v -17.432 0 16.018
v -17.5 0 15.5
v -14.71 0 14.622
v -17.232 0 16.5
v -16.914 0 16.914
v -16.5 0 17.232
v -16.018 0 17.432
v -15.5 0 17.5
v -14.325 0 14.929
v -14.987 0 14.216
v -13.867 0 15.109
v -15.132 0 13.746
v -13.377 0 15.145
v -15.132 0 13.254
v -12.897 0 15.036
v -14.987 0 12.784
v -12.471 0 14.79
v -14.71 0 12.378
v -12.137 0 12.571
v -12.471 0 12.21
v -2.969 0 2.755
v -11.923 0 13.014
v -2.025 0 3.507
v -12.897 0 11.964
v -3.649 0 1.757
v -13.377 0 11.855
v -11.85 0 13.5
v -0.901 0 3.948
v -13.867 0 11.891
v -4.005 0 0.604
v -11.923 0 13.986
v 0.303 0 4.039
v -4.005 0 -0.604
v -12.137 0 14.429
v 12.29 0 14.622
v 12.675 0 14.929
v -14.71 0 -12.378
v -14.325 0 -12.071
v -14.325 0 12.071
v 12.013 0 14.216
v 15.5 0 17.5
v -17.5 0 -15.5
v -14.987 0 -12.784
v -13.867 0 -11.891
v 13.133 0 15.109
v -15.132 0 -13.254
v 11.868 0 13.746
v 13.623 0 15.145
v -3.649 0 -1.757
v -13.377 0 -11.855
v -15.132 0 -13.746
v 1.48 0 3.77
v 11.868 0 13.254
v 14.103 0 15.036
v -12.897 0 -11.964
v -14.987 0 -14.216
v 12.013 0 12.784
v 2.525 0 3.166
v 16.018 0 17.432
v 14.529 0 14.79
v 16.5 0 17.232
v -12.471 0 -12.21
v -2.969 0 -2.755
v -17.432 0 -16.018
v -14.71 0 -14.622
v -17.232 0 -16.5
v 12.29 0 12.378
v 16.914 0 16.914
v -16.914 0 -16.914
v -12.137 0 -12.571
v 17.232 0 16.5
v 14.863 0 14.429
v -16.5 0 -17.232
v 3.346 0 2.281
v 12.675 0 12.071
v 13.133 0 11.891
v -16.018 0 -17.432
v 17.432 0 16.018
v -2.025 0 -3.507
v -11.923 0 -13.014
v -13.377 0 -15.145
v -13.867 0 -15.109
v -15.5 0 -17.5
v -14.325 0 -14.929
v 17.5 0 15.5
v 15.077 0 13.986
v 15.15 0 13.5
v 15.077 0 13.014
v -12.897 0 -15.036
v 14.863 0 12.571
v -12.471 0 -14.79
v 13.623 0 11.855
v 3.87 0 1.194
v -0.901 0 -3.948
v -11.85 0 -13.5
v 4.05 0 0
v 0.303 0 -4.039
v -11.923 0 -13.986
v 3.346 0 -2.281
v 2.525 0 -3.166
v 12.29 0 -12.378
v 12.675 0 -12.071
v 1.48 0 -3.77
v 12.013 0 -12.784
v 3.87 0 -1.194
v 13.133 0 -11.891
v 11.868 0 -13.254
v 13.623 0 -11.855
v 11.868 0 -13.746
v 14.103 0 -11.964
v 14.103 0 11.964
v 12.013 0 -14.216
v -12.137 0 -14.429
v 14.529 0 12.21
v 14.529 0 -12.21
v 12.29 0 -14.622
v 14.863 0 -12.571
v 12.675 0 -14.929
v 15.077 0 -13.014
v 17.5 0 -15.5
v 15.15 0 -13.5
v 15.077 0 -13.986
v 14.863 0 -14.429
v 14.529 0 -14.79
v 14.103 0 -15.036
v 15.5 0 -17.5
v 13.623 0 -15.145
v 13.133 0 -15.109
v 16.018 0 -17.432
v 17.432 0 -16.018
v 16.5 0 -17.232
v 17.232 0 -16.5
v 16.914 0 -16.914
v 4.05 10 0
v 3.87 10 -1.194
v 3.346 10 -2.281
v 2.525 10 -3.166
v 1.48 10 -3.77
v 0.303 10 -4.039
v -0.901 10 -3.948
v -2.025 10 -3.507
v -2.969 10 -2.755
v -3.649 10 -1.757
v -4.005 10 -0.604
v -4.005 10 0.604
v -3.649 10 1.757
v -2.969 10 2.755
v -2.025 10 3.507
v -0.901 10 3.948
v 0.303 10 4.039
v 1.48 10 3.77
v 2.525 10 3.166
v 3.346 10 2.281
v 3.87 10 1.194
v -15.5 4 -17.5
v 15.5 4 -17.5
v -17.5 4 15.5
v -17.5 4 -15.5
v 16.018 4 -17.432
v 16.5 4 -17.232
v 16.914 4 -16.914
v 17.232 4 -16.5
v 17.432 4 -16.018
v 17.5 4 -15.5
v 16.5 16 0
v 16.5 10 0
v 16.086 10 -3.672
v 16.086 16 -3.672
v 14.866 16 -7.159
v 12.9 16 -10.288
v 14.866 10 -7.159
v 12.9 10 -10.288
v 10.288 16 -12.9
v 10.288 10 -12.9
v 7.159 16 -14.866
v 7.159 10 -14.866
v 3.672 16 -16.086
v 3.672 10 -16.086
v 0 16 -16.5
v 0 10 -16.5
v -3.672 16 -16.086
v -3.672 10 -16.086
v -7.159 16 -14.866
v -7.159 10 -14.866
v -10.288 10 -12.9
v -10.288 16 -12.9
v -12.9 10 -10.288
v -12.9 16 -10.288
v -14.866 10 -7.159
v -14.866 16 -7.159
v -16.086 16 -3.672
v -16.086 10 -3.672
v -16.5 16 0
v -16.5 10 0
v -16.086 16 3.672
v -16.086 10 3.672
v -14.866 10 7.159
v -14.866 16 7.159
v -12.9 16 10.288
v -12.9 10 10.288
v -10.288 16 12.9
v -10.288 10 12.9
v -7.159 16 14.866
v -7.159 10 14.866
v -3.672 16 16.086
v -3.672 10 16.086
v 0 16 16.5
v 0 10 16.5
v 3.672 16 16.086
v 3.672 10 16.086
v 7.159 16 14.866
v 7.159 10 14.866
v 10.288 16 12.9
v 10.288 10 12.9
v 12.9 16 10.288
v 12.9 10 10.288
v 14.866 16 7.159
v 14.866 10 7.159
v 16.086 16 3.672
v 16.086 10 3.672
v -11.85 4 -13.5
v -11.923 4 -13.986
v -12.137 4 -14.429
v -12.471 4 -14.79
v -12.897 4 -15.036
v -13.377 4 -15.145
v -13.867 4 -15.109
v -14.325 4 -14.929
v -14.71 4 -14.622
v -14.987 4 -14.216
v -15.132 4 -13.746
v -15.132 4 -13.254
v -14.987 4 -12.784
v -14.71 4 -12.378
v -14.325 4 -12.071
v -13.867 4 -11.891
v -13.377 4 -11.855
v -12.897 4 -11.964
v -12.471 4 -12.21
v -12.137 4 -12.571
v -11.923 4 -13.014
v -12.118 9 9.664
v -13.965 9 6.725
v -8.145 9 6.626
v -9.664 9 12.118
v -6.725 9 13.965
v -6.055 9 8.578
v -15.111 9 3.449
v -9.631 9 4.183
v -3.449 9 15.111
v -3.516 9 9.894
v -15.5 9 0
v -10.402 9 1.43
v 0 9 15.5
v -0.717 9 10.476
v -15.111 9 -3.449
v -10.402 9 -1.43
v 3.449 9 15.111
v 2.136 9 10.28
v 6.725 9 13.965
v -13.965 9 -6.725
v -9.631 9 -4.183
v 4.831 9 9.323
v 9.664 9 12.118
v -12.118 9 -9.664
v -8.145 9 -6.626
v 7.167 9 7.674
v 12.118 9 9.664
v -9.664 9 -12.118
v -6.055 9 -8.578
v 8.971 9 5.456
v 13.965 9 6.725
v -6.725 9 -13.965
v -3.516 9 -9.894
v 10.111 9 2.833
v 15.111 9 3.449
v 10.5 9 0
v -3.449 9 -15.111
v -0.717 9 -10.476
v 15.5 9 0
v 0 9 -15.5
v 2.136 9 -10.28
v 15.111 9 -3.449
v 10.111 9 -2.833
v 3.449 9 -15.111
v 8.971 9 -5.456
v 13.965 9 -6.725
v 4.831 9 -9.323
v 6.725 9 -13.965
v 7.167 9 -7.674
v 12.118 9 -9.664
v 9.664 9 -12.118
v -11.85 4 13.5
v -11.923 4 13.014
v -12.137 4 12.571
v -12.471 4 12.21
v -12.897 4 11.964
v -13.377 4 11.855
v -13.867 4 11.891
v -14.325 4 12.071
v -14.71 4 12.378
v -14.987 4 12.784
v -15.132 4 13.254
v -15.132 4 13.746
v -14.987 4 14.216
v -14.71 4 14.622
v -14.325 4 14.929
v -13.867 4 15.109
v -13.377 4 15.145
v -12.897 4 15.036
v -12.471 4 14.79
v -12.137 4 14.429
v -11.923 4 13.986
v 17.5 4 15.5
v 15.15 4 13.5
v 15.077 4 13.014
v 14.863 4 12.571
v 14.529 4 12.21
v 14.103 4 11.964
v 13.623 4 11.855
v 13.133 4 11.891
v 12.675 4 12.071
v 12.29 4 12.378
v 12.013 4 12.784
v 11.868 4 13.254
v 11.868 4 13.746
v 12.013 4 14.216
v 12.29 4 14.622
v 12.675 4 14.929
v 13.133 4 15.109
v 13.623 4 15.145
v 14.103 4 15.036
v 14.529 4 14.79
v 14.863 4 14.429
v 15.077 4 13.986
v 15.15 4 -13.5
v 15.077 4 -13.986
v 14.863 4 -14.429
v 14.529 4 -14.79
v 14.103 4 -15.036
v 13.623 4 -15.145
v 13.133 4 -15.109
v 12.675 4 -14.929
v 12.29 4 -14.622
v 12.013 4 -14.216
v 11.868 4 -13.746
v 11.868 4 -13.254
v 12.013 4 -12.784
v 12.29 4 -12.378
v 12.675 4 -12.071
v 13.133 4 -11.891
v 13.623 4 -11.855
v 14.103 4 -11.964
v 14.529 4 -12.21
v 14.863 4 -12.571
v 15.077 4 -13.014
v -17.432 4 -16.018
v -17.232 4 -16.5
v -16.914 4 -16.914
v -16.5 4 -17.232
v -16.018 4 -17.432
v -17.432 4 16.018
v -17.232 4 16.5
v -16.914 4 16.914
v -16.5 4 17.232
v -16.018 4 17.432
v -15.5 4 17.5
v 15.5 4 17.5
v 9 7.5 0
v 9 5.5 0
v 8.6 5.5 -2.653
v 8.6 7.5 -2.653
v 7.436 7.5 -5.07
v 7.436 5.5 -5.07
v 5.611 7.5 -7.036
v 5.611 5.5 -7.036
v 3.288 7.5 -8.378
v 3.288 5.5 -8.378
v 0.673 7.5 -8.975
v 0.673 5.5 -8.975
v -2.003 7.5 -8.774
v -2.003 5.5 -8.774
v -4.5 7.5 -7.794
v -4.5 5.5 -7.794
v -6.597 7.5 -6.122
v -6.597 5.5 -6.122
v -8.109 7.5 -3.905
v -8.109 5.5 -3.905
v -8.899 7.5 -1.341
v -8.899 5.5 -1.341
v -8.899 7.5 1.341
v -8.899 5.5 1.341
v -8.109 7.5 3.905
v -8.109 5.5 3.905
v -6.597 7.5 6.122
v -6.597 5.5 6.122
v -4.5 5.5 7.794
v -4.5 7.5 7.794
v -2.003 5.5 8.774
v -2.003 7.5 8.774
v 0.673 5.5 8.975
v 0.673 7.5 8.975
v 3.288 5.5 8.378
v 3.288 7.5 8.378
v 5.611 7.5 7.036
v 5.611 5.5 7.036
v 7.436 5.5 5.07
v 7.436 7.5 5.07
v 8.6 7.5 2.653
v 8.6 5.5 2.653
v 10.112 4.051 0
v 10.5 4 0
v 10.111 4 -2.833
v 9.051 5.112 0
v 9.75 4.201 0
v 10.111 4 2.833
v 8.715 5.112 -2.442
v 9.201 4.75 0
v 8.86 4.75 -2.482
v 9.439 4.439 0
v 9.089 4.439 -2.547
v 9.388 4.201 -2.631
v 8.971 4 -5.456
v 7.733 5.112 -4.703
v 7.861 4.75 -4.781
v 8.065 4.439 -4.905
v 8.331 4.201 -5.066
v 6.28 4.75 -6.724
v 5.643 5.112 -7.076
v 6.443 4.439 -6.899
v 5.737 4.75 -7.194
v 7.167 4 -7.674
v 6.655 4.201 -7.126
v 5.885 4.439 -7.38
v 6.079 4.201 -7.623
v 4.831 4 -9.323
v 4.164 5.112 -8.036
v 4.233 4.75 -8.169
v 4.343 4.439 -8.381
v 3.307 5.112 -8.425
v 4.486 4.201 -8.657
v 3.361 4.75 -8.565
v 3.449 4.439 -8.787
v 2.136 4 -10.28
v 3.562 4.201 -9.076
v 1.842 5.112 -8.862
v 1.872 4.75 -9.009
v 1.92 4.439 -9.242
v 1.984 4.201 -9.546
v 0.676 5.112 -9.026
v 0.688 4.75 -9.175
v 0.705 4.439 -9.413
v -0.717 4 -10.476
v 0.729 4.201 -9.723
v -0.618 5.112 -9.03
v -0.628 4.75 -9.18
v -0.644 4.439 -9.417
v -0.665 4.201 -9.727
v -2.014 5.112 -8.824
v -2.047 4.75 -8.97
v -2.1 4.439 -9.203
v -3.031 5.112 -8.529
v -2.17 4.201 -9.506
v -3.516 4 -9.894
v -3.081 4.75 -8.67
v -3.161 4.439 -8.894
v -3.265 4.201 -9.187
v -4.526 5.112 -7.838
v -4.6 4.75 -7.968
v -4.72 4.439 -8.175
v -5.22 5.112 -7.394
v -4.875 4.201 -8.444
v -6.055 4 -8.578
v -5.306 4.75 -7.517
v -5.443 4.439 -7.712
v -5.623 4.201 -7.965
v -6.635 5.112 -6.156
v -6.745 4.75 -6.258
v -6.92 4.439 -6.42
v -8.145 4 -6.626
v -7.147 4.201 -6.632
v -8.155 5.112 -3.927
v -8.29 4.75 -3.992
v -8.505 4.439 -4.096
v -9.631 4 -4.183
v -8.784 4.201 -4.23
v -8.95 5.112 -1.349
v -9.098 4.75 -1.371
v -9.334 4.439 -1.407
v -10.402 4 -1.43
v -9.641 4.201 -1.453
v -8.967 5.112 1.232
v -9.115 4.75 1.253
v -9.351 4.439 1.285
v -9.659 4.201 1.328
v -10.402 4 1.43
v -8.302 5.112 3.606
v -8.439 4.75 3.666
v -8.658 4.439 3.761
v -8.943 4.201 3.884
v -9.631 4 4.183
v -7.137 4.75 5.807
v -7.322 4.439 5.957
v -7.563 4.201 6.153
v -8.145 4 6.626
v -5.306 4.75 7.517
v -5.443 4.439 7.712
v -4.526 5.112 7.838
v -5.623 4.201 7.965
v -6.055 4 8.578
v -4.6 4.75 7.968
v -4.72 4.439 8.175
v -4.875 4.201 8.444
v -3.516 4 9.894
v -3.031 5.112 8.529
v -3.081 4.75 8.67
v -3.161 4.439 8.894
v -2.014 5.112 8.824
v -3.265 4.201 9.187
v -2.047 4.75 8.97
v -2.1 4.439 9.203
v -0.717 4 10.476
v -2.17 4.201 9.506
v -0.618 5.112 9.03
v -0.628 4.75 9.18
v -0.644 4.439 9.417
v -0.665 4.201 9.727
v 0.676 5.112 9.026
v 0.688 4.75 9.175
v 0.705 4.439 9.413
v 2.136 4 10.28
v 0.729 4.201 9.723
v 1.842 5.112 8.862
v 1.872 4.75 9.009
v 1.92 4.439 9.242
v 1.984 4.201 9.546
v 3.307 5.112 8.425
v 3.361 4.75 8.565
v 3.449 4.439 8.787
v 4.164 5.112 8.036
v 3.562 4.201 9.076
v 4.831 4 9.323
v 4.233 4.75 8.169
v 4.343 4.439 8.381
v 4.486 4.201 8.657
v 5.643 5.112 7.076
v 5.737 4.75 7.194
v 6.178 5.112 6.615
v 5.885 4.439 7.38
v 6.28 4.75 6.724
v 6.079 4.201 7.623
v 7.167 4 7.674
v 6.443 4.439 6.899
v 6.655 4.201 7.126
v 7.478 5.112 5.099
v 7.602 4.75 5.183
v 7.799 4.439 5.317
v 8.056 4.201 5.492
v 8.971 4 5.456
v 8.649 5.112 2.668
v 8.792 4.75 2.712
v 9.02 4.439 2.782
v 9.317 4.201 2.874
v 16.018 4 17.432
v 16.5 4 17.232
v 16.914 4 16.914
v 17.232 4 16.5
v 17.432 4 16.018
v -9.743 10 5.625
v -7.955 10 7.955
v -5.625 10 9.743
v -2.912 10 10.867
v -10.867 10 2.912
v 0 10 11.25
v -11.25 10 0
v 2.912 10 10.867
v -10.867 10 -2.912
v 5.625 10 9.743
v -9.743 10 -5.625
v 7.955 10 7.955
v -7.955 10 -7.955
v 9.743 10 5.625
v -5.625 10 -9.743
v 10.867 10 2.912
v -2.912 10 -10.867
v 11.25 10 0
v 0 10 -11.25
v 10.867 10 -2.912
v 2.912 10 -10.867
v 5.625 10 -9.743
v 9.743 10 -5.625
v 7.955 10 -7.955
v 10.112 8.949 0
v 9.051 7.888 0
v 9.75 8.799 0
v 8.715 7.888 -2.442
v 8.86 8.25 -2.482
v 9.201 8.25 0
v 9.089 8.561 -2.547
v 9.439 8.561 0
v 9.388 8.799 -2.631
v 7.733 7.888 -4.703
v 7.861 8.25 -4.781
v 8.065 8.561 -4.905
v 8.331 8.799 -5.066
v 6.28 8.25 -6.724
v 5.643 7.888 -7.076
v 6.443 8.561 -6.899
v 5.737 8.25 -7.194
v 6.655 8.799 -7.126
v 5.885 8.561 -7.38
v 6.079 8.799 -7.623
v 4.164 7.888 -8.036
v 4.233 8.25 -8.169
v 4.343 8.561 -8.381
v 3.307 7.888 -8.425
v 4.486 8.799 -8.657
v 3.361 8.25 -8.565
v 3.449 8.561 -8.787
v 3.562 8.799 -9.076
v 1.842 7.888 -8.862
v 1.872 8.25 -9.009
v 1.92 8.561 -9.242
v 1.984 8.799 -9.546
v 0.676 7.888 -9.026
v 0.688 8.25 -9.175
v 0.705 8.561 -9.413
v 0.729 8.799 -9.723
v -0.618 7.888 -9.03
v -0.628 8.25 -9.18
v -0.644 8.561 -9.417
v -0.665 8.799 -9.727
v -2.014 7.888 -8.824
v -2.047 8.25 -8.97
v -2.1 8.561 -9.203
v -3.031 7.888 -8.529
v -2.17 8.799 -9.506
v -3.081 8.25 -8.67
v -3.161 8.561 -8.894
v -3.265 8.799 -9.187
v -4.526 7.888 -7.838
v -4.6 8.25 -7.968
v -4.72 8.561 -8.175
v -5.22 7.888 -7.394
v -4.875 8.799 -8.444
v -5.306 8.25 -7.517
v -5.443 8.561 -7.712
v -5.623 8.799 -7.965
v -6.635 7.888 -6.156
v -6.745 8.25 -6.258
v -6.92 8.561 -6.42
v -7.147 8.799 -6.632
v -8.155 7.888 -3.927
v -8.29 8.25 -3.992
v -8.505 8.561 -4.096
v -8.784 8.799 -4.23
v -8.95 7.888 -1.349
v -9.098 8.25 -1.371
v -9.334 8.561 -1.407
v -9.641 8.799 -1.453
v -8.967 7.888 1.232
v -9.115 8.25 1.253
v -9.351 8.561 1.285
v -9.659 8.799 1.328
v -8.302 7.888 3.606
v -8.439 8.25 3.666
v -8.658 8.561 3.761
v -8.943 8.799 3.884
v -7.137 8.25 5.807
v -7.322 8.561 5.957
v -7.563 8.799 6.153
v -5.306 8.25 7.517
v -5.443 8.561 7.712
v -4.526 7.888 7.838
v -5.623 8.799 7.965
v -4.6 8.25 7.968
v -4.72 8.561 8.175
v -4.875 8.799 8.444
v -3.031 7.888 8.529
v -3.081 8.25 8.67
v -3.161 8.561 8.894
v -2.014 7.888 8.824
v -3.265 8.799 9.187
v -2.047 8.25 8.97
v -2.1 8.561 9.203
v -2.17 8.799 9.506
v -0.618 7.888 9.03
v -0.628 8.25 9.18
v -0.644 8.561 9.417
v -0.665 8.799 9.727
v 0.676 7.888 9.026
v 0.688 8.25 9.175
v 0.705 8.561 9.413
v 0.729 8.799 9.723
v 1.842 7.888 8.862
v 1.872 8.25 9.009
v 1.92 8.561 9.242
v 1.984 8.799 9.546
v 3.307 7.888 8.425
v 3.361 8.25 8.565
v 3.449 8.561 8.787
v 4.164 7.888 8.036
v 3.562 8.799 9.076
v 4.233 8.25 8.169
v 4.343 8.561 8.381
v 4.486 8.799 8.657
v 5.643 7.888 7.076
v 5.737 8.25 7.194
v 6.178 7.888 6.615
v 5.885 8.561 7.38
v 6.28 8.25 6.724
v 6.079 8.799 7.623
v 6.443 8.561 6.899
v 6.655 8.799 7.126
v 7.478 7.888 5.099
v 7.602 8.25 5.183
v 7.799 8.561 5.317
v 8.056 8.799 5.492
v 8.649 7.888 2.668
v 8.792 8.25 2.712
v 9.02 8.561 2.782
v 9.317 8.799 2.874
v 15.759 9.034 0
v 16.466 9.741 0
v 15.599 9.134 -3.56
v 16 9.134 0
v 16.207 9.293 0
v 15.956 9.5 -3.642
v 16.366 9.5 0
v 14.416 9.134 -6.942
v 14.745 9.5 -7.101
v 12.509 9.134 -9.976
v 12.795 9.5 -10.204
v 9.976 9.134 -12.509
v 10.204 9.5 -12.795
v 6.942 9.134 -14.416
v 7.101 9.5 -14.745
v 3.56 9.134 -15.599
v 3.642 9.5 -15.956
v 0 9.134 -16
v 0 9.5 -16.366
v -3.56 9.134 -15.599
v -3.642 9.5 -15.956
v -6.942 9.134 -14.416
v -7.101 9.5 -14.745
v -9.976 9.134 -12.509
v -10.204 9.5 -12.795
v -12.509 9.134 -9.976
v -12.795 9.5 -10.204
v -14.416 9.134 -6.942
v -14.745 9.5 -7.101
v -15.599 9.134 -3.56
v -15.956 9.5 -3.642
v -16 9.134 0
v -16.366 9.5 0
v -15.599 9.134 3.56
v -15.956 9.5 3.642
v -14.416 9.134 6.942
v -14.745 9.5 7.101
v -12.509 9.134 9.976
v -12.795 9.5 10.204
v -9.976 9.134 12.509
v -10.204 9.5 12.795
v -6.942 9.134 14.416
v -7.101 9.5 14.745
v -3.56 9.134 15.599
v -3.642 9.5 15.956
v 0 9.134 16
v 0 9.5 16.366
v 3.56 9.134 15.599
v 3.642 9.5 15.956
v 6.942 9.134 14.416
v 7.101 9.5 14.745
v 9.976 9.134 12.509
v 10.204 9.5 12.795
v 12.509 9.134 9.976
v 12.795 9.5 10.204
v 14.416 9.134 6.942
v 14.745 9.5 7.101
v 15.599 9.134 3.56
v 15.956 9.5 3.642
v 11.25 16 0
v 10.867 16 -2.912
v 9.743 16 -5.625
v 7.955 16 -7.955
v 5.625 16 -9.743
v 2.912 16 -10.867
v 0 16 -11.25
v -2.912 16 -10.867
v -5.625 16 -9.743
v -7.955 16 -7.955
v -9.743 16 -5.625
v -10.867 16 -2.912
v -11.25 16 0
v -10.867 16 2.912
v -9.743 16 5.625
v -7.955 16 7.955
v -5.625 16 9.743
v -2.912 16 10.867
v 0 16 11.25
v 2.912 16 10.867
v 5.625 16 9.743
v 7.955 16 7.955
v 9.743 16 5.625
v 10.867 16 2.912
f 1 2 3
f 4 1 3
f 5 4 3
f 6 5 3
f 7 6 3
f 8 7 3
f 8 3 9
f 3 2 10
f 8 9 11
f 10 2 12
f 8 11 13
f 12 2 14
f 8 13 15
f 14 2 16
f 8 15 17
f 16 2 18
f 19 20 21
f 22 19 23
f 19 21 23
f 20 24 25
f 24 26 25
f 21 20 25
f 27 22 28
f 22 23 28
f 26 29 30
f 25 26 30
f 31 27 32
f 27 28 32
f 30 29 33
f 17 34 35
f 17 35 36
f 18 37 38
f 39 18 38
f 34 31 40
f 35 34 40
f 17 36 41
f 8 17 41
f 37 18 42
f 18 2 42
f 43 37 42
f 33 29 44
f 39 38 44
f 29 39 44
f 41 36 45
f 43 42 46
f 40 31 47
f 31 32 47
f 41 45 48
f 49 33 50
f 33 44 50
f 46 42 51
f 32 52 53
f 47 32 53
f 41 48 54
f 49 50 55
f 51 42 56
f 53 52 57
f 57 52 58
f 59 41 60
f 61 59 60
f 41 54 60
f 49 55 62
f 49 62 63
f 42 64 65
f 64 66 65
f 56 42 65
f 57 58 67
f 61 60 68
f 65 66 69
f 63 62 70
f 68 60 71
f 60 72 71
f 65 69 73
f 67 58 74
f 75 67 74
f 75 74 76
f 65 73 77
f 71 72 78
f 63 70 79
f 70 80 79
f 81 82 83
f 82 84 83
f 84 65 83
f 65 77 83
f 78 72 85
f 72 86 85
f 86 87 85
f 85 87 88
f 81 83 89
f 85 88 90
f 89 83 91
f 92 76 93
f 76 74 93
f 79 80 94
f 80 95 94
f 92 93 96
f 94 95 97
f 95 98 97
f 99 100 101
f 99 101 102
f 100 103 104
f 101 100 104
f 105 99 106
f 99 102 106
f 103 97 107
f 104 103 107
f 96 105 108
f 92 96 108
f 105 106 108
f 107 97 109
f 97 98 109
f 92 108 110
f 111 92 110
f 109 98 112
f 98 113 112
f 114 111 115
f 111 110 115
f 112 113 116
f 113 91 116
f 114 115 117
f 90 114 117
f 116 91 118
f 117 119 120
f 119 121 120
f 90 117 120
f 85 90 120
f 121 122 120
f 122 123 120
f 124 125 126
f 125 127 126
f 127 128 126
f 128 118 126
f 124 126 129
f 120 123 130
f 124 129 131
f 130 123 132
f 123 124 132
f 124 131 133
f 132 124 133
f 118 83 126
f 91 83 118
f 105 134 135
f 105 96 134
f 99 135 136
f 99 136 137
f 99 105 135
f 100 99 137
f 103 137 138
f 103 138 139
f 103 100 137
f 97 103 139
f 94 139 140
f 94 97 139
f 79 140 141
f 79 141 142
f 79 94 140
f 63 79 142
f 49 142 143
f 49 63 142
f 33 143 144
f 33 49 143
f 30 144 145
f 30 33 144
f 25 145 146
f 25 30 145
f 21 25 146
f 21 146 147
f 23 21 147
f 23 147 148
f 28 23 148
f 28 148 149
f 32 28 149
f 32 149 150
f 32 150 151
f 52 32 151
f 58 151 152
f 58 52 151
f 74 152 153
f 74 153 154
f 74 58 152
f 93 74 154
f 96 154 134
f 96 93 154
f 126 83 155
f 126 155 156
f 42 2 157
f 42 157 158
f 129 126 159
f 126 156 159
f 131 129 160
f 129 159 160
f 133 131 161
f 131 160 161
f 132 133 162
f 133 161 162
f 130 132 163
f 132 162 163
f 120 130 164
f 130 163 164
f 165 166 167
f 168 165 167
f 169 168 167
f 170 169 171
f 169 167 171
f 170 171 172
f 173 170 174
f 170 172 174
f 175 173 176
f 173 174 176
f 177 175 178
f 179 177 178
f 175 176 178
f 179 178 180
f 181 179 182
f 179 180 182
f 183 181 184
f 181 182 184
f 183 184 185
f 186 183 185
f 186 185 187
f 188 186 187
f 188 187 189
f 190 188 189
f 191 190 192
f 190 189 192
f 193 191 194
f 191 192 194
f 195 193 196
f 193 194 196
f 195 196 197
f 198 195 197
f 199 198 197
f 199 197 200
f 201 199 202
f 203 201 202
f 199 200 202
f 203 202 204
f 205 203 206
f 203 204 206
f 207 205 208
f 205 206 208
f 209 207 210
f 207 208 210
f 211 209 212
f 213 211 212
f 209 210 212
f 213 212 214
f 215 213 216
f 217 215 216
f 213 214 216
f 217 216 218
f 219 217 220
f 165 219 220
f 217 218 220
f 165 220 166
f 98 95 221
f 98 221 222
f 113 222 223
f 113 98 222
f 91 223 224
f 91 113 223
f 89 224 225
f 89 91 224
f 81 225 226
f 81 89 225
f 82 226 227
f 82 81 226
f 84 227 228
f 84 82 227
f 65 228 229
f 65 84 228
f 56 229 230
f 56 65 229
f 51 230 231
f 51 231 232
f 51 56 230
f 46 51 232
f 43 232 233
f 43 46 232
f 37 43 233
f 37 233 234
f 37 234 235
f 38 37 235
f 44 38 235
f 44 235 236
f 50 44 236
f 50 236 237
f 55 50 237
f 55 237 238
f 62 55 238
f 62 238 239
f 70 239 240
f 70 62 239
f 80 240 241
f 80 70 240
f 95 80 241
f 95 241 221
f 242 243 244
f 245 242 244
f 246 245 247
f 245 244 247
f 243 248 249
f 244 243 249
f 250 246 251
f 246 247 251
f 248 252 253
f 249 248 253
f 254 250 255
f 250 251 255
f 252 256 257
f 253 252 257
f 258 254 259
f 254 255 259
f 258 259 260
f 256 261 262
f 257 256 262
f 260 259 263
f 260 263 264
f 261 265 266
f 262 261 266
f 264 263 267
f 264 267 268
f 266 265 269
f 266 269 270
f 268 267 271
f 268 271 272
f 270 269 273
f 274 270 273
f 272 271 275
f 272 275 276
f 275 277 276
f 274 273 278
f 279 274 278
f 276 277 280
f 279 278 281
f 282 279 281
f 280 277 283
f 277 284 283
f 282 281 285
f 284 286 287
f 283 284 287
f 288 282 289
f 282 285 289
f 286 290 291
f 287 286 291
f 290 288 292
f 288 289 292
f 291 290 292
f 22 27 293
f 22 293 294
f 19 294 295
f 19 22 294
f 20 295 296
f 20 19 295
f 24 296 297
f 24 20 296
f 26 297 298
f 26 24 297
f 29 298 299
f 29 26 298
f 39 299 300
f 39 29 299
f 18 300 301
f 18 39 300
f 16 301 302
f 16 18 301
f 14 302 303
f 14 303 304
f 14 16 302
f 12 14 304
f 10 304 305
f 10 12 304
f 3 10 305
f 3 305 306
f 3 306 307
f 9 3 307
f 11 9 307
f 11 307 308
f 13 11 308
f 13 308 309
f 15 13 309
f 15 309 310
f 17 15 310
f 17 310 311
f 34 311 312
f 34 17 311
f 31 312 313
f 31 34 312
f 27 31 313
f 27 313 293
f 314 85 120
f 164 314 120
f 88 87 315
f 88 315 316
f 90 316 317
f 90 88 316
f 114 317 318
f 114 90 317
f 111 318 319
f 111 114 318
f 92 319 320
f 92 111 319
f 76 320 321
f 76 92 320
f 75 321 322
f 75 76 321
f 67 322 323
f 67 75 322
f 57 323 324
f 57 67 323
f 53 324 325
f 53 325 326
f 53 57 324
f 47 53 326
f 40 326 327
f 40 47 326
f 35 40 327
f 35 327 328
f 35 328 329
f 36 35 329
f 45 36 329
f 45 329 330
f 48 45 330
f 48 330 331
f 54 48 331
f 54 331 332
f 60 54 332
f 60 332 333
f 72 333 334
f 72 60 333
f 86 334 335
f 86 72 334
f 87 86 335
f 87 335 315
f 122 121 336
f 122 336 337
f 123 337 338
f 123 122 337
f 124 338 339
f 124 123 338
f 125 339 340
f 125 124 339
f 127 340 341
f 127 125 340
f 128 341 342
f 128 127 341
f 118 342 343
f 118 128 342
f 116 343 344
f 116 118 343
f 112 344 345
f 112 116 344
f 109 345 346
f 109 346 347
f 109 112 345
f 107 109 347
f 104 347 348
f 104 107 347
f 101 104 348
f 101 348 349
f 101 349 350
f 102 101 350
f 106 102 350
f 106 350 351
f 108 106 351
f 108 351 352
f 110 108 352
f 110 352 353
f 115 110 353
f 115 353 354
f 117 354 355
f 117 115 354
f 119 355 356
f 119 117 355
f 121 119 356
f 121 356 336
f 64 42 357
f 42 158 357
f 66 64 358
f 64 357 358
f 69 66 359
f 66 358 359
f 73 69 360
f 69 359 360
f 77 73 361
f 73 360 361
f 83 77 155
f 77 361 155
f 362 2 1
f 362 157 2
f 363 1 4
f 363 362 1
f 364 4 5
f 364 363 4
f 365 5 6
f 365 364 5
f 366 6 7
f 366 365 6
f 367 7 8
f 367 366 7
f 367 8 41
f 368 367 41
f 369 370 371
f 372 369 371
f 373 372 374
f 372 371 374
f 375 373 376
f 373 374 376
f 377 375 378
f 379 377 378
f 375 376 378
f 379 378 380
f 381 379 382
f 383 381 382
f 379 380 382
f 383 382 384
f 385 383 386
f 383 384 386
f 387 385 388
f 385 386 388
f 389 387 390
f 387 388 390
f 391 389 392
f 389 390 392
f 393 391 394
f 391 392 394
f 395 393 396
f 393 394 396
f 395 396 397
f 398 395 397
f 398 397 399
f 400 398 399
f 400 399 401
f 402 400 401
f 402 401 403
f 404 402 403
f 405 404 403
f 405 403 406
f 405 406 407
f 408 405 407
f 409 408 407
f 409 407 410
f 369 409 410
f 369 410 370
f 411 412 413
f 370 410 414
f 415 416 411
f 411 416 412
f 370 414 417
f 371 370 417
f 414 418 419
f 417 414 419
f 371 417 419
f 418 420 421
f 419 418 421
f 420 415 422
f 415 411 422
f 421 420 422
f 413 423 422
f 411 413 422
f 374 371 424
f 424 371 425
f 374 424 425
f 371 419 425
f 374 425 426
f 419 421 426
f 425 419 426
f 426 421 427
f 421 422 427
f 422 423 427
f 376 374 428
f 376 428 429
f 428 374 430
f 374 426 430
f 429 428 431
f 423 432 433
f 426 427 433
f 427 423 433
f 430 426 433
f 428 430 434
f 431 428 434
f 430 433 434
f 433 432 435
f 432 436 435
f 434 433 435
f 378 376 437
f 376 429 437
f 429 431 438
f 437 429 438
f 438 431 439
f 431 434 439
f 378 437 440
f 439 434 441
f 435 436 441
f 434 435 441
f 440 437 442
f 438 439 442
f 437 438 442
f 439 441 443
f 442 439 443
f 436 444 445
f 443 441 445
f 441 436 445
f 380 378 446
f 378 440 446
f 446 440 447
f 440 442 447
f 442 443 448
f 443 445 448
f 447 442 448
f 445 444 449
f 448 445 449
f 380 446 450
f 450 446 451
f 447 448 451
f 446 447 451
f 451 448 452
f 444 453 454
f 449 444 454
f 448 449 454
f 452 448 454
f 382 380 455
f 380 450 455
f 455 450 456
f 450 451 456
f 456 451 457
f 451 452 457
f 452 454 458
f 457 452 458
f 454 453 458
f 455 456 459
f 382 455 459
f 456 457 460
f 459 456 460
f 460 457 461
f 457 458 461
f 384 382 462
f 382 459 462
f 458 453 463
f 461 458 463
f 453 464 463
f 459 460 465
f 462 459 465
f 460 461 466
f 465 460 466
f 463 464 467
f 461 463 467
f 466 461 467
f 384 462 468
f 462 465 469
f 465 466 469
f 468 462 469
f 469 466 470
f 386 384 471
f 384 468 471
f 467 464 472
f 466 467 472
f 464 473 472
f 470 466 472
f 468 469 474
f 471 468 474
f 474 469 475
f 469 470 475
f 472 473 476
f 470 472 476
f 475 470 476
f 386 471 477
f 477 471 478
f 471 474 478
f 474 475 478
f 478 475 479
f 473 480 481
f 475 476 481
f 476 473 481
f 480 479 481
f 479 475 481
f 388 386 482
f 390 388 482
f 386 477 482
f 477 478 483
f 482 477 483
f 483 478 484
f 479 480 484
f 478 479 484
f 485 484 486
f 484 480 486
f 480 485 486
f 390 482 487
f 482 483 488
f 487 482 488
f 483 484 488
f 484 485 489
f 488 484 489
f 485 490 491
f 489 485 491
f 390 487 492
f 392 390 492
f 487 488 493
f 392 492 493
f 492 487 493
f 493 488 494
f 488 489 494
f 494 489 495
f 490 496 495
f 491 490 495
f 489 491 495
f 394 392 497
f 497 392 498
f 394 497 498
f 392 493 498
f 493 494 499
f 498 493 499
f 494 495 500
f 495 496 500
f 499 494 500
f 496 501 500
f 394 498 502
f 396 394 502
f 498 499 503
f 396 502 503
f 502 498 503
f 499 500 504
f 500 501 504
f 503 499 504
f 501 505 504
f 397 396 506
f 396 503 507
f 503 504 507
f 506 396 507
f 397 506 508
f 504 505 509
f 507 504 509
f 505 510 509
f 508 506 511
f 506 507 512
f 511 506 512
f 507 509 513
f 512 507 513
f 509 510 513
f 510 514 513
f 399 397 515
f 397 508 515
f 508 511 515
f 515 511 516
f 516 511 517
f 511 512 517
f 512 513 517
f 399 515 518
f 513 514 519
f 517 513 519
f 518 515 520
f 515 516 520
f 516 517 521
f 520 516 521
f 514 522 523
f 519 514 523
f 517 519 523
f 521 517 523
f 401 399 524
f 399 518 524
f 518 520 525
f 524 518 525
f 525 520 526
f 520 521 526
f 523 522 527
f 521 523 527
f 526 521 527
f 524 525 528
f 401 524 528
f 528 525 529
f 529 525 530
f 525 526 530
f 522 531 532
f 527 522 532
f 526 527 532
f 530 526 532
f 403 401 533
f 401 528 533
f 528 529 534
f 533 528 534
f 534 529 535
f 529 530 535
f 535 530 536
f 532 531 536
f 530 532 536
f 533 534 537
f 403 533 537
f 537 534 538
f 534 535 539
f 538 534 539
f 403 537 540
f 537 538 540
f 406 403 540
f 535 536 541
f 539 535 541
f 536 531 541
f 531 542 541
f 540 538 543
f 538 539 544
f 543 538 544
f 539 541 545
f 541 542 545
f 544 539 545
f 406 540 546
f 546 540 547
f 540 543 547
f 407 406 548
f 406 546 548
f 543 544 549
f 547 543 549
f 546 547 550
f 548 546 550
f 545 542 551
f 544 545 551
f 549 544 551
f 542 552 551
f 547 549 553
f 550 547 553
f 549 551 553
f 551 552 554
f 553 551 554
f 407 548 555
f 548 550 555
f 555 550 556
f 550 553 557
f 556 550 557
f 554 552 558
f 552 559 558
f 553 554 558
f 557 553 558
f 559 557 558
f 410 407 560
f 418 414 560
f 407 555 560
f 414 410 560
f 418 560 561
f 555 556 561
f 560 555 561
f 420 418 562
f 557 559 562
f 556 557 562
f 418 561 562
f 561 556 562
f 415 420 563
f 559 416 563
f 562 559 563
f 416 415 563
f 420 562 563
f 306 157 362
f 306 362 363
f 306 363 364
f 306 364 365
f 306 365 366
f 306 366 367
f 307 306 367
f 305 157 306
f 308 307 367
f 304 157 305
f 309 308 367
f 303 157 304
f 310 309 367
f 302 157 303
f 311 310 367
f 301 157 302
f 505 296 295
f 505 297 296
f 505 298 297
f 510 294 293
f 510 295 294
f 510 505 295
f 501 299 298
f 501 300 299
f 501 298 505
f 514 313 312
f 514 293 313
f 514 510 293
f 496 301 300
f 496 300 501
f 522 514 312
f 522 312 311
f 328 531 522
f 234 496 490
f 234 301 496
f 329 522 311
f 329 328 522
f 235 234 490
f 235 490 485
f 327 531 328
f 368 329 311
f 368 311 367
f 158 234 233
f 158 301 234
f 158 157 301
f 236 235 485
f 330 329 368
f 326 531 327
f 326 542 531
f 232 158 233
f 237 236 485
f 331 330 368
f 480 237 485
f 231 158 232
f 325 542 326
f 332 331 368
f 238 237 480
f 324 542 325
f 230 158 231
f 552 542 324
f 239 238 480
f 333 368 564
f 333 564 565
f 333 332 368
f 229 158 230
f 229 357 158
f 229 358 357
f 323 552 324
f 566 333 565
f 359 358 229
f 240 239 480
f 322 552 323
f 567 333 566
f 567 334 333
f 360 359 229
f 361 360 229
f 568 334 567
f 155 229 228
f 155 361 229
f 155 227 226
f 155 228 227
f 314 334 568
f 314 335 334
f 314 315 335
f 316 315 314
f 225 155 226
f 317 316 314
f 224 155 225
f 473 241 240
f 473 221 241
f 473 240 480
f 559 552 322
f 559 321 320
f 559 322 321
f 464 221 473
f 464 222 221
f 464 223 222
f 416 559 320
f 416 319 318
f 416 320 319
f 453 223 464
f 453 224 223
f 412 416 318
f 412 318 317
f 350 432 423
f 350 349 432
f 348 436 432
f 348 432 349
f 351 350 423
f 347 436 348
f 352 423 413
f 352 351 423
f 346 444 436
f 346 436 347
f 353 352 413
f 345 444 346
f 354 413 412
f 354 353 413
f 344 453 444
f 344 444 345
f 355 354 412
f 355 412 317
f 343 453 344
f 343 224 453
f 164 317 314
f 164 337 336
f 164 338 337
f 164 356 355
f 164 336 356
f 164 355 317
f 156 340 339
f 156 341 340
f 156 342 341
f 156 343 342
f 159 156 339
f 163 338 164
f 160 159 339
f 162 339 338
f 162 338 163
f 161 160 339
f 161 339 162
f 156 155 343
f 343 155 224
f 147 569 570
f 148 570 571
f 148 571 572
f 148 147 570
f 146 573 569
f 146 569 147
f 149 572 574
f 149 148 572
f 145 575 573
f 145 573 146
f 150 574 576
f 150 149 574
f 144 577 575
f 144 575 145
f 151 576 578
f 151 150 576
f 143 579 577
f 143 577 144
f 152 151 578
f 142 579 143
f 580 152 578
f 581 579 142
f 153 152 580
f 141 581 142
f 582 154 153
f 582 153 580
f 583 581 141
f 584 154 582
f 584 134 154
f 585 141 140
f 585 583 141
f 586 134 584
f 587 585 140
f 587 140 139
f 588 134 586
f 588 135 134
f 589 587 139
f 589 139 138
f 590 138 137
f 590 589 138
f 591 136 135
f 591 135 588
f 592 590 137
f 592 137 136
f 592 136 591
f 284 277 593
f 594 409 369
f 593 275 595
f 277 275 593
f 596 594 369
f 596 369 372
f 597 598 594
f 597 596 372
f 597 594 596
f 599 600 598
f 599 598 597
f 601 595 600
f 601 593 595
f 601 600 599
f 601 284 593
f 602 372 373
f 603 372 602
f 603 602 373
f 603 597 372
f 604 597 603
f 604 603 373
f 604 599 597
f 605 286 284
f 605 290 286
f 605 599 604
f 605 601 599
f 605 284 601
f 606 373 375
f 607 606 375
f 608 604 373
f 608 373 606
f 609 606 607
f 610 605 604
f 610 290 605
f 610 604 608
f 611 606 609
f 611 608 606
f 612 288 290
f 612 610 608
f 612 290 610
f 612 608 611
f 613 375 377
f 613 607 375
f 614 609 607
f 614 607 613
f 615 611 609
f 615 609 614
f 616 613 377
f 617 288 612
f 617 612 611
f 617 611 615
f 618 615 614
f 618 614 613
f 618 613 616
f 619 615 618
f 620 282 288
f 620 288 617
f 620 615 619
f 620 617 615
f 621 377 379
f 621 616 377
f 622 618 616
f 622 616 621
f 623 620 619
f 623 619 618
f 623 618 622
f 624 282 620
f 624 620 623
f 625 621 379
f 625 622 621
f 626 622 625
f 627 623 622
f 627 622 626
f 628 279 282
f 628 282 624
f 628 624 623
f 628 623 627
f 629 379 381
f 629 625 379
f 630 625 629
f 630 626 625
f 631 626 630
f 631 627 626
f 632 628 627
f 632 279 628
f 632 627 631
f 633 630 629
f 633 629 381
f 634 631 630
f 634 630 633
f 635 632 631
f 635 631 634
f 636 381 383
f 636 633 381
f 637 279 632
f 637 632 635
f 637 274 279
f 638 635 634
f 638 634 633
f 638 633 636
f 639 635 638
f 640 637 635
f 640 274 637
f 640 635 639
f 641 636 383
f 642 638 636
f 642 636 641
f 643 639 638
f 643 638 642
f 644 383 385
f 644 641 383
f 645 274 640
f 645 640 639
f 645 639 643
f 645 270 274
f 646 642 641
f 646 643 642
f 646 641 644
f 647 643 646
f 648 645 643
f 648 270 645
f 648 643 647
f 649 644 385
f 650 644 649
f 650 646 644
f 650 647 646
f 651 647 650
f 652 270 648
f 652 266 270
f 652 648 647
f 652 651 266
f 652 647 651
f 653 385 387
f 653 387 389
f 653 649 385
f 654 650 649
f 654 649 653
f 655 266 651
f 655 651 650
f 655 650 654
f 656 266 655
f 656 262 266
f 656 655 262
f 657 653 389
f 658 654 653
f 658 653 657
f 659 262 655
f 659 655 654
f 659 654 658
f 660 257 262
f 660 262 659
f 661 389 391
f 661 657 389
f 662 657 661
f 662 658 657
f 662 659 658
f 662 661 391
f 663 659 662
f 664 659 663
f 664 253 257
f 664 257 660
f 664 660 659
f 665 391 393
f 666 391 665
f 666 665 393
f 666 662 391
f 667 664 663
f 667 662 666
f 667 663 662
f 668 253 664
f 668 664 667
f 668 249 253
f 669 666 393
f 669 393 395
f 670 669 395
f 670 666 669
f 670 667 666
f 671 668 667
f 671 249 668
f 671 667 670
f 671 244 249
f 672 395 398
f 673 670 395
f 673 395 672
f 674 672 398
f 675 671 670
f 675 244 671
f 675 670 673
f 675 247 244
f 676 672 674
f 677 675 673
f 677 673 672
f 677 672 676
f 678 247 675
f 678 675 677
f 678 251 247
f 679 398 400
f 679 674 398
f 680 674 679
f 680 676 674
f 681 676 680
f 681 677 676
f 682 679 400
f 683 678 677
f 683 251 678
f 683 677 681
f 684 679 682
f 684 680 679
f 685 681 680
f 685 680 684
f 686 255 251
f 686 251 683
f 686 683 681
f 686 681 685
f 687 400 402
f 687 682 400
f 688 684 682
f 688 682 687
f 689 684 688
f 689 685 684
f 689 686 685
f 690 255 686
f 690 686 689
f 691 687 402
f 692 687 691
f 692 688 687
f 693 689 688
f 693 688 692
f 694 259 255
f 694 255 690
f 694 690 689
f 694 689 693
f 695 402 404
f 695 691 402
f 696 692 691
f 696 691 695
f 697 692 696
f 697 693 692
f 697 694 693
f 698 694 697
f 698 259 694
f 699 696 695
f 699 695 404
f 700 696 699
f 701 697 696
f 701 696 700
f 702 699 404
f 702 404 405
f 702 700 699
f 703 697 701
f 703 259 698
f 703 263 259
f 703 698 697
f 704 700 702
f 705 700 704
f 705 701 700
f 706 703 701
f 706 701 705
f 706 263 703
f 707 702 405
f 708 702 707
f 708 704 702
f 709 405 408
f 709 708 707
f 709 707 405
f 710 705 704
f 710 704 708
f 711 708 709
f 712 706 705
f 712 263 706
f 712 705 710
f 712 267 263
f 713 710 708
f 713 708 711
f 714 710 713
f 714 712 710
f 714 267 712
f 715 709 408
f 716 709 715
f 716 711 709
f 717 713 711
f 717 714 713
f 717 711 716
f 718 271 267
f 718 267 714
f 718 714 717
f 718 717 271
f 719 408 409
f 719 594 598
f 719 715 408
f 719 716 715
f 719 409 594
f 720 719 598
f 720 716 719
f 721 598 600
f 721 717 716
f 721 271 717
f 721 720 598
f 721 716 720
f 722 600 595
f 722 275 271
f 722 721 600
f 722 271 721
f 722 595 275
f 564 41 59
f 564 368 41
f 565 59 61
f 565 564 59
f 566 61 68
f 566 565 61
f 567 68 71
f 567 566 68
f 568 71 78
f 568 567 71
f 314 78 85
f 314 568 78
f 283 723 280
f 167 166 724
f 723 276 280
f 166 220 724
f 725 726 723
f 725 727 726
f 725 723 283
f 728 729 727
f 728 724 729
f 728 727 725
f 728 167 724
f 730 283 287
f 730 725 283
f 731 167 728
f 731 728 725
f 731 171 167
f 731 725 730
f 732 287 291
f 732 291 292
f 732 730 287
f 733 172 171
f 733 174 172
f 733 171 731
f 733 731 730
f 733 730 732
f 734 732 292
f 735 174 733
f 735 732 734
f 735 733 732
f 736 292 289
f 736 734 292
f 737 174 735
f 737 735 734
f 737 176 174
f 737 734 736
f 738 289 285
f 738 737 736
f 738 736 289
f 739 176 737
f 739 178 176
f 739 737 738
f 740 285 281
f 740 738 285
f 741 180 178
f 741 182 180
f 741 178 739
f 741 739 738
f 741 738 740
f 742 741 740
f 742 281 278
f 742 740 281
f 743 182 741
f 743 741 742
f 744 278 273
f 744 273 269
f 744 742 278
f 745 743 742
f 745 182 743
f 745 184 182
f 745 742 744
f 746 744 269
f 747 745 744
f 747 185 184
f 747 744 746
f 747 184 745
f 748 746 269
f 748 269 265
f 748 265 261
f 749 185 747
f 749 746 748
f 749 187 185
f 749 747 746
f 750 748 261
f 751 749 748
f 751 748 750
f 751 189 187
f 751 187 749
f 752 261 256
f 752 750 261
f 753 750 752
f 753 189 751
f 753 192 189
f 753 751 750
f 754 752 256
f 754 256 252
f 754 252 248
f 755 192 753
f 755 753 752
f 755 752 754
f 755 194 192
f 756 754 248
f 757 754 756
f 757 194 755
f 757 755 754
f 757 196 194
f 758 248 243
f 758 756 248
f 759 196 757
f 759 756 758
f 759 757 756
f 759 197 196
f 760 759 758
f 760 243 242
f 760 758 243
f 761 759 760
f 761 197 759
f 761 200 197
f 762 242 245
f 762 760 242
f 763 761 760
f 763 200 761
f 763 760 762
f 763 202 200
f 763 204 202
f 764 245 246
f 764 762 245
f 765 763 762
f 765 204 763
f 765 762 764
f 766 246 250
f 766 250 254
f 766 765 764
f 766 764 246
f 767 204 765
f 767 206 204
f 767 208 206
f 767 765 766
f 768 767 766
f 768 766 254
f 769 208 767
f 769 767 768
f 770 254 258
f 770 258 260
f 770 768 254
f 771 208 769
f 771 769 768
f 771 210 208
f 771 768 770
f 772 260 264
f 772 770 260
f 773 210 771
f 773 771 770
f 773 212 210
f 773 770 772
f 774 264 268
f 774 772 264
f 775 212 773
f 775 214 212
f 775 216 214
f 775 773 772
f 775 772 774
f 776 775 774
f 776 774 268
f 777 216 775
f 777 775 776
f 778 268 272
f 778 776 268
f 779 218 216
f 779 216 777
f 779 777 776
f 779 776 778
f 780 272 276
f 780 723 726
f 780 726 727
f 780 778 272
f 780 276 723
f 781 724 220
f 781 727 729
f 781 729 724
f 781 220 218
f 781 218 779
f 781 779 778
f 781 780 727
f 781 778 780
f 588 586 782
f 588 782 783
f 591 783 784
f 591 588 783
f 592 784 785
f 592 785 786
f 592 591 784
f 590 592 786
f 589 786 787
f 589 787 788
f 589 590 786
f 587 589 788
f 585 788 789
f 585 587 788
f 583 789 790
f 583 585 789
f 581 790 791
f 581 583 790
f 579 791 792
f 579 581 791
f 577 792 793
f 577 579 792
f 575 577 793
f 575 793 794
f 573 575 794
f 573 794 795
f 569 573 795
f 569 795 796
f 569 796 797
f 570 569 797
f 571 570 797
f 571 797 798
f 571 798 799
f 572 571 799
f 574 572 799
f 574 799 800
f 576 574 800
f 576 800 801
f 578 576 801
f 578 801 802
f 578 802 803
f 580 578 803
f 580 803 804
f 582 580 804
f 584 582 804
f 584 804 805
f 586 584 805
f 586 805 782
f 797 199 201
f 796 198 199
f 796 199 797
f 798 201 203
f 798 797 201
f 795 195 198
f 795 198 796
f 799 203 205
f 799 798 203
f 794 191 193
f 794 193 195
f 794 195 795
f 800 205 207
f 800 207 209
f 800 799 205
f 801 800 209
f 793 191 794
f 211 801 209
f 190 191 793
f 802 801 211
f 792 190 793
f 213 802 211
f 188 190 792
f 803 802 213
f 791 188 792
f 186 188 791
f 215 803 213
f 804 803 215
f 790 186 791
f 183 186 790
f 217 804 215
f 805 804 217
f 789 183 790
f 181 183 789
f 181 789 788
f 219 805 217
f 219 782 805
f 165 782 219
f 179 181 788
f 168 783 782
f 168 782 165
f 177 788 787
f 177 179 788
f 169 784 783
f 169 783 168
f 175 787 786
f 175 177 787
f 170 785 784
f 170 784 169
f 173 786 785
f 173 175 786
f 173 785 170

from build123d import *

# Parameters (mm, degrees)
CROQUIS1_W              = 35
CROQUIS1_H              = 35
CROQUIS1_R              = 1.65
CROQUIS1_R_2            = 9
SALIENTE_EXTRUIR1_DEPTH = 4
REDONDEO2_R             = 2
CROQUIS1_8_R            = 9
CROQUIS1_8_R_2          = 4.05
SALIENTE_EXTRUIR2_DEPTH = 9
CROQUIS2_R              = 16.5
CROQUIS2_R_2            = 11.25
SALIENTE_EXTRUIR3_DEPTH = 7
REDONDEO3_R             = 1.5
CROQUIS2_3_R            = 11.25
CROQUIS2_3_R_2          = 9
CROQUIS2_3_R_3          = 4.05
SALIENTE_EXTRUIR4_DEPTH = 1
REDONDEO4_R             = 1.5
REDONDEO5_R             = 1


with BuildPart() as part:
    # Croquis1 → Saliente-Extruir1 (new body)
    with BuildSketch(Plane(origin=(0, 0, 0), x_dir=(1, 0, 0), z_dir=(0, 1, 0))):
        Rectangle(CROQUIS1_W, CROQUIS1_H)
        with Locations((-13.5, -13.5)):
            Circle(CROQUIS1_R, mode=Mode.SUBTRACT)
        with Locations((13.5, -13.5)):
            Circle(CROQUIS1_R, mode=Mode.SUBTRACT)
        with Locations((13.5, 13.5)):
            Circle(CROQUIS1_R, mode=Mode.SUBTRACT)
        with Locations((-13.5, 13.5)):
            Circle(CROQUIS1_R, mode=Mode.SUBTRACT)
        Circle(CROQUIS1_R_2, mode=Mode.SUBTRACT)
    extrude(amount=SALIENTE_EXTRUIR1_DEPTH)

    # Redondeo2
    redondeo2_edges = [part.edges().sort_by_distance(p)[0] for p in [
        (17.5, 2, 17.5),
        (-17.5, 2, 17.5),
        (-17.5, 2, -17.5),
        (17.5, 2, -17.5),
    ]]
    fillet(redondeo2_edges, radius=REDONDEO2_R)

    # Croquis1<8> → Saliente-Extruir2 (add)
    with BuildSketch(Plane(origin=(0, 0, 0), x_dir=(1, 0, 0), z_dir=(0, 1, 0))):
        Circle(CROQUIS1_8_R)
        Circle(CROQUIS1_8_R_2, mode=Mode.SUBTRACT)
    extrude(amount=SALIENTE_EXTRUIR2_DEPTH)

    # Redondeo3
    redondeo3_edges = [part.edges().sort_by_distance(p)[0] for p in [
        (-9, 4, 0),
    ]]
    fillet(redondeo3_edges, radius=REDONDEO3_R)



with BuildPart() as body_2:
    # Croquis2 → Saliente-Extruir3 (new body)
    with BuildSketch(Plane(origin=(0, 9, 0), x_dir=(1, 0, 0), z_dir=(0, 1, 0))):
        Circle(CROQUIS2_R)
        Circle(CROQUIS2_R_2, mode=Mode.SUBTRACT)
    extrude(amount=SALIENTE_EXTRUIR3_DEPTH)


with BuildPart() as part_1:
    add(part.part)

    add(body_2.part)  # Saliente-Extruir4 merges body 2
    # Croquis2<3> → Saliente-Extruir4 (add)
    with BuildSketch(Plane(origin=(0, 9, 0), x_dir=(1, 0, 0), z_dir=(0, 1, 0))):
        Circle(CROQUIS2_3_R)
        Circle(CROQUIS2_3_R_2, mode=Mode.SUBTRACT)
        Circle(CROQUIS2_3_R_2)
        Circle(CROQUIS2_3_R_3, mode=Mode.SUBTRACT)
    extrude(amount=SALIENTE_EXTRUIR4_DEPTH)

    # Redondeo4
    redondeo4_edges = [part_1.edges().sort_by_distance(p)[0] for p in [
        (-9, 9, 0),
    ]]
    fillet(redondeo4_edges, radius=REDONDEO4_R)

    # Redondeo5
    redondeo5_edges = [part_1.edges().sort_by_distance(p)[0] for p in [
        (-16.5, 9, 0),
    ]]
    fillet(redondeo5_edges, radius=REDONDEO5_R)


solid = part_1.part
